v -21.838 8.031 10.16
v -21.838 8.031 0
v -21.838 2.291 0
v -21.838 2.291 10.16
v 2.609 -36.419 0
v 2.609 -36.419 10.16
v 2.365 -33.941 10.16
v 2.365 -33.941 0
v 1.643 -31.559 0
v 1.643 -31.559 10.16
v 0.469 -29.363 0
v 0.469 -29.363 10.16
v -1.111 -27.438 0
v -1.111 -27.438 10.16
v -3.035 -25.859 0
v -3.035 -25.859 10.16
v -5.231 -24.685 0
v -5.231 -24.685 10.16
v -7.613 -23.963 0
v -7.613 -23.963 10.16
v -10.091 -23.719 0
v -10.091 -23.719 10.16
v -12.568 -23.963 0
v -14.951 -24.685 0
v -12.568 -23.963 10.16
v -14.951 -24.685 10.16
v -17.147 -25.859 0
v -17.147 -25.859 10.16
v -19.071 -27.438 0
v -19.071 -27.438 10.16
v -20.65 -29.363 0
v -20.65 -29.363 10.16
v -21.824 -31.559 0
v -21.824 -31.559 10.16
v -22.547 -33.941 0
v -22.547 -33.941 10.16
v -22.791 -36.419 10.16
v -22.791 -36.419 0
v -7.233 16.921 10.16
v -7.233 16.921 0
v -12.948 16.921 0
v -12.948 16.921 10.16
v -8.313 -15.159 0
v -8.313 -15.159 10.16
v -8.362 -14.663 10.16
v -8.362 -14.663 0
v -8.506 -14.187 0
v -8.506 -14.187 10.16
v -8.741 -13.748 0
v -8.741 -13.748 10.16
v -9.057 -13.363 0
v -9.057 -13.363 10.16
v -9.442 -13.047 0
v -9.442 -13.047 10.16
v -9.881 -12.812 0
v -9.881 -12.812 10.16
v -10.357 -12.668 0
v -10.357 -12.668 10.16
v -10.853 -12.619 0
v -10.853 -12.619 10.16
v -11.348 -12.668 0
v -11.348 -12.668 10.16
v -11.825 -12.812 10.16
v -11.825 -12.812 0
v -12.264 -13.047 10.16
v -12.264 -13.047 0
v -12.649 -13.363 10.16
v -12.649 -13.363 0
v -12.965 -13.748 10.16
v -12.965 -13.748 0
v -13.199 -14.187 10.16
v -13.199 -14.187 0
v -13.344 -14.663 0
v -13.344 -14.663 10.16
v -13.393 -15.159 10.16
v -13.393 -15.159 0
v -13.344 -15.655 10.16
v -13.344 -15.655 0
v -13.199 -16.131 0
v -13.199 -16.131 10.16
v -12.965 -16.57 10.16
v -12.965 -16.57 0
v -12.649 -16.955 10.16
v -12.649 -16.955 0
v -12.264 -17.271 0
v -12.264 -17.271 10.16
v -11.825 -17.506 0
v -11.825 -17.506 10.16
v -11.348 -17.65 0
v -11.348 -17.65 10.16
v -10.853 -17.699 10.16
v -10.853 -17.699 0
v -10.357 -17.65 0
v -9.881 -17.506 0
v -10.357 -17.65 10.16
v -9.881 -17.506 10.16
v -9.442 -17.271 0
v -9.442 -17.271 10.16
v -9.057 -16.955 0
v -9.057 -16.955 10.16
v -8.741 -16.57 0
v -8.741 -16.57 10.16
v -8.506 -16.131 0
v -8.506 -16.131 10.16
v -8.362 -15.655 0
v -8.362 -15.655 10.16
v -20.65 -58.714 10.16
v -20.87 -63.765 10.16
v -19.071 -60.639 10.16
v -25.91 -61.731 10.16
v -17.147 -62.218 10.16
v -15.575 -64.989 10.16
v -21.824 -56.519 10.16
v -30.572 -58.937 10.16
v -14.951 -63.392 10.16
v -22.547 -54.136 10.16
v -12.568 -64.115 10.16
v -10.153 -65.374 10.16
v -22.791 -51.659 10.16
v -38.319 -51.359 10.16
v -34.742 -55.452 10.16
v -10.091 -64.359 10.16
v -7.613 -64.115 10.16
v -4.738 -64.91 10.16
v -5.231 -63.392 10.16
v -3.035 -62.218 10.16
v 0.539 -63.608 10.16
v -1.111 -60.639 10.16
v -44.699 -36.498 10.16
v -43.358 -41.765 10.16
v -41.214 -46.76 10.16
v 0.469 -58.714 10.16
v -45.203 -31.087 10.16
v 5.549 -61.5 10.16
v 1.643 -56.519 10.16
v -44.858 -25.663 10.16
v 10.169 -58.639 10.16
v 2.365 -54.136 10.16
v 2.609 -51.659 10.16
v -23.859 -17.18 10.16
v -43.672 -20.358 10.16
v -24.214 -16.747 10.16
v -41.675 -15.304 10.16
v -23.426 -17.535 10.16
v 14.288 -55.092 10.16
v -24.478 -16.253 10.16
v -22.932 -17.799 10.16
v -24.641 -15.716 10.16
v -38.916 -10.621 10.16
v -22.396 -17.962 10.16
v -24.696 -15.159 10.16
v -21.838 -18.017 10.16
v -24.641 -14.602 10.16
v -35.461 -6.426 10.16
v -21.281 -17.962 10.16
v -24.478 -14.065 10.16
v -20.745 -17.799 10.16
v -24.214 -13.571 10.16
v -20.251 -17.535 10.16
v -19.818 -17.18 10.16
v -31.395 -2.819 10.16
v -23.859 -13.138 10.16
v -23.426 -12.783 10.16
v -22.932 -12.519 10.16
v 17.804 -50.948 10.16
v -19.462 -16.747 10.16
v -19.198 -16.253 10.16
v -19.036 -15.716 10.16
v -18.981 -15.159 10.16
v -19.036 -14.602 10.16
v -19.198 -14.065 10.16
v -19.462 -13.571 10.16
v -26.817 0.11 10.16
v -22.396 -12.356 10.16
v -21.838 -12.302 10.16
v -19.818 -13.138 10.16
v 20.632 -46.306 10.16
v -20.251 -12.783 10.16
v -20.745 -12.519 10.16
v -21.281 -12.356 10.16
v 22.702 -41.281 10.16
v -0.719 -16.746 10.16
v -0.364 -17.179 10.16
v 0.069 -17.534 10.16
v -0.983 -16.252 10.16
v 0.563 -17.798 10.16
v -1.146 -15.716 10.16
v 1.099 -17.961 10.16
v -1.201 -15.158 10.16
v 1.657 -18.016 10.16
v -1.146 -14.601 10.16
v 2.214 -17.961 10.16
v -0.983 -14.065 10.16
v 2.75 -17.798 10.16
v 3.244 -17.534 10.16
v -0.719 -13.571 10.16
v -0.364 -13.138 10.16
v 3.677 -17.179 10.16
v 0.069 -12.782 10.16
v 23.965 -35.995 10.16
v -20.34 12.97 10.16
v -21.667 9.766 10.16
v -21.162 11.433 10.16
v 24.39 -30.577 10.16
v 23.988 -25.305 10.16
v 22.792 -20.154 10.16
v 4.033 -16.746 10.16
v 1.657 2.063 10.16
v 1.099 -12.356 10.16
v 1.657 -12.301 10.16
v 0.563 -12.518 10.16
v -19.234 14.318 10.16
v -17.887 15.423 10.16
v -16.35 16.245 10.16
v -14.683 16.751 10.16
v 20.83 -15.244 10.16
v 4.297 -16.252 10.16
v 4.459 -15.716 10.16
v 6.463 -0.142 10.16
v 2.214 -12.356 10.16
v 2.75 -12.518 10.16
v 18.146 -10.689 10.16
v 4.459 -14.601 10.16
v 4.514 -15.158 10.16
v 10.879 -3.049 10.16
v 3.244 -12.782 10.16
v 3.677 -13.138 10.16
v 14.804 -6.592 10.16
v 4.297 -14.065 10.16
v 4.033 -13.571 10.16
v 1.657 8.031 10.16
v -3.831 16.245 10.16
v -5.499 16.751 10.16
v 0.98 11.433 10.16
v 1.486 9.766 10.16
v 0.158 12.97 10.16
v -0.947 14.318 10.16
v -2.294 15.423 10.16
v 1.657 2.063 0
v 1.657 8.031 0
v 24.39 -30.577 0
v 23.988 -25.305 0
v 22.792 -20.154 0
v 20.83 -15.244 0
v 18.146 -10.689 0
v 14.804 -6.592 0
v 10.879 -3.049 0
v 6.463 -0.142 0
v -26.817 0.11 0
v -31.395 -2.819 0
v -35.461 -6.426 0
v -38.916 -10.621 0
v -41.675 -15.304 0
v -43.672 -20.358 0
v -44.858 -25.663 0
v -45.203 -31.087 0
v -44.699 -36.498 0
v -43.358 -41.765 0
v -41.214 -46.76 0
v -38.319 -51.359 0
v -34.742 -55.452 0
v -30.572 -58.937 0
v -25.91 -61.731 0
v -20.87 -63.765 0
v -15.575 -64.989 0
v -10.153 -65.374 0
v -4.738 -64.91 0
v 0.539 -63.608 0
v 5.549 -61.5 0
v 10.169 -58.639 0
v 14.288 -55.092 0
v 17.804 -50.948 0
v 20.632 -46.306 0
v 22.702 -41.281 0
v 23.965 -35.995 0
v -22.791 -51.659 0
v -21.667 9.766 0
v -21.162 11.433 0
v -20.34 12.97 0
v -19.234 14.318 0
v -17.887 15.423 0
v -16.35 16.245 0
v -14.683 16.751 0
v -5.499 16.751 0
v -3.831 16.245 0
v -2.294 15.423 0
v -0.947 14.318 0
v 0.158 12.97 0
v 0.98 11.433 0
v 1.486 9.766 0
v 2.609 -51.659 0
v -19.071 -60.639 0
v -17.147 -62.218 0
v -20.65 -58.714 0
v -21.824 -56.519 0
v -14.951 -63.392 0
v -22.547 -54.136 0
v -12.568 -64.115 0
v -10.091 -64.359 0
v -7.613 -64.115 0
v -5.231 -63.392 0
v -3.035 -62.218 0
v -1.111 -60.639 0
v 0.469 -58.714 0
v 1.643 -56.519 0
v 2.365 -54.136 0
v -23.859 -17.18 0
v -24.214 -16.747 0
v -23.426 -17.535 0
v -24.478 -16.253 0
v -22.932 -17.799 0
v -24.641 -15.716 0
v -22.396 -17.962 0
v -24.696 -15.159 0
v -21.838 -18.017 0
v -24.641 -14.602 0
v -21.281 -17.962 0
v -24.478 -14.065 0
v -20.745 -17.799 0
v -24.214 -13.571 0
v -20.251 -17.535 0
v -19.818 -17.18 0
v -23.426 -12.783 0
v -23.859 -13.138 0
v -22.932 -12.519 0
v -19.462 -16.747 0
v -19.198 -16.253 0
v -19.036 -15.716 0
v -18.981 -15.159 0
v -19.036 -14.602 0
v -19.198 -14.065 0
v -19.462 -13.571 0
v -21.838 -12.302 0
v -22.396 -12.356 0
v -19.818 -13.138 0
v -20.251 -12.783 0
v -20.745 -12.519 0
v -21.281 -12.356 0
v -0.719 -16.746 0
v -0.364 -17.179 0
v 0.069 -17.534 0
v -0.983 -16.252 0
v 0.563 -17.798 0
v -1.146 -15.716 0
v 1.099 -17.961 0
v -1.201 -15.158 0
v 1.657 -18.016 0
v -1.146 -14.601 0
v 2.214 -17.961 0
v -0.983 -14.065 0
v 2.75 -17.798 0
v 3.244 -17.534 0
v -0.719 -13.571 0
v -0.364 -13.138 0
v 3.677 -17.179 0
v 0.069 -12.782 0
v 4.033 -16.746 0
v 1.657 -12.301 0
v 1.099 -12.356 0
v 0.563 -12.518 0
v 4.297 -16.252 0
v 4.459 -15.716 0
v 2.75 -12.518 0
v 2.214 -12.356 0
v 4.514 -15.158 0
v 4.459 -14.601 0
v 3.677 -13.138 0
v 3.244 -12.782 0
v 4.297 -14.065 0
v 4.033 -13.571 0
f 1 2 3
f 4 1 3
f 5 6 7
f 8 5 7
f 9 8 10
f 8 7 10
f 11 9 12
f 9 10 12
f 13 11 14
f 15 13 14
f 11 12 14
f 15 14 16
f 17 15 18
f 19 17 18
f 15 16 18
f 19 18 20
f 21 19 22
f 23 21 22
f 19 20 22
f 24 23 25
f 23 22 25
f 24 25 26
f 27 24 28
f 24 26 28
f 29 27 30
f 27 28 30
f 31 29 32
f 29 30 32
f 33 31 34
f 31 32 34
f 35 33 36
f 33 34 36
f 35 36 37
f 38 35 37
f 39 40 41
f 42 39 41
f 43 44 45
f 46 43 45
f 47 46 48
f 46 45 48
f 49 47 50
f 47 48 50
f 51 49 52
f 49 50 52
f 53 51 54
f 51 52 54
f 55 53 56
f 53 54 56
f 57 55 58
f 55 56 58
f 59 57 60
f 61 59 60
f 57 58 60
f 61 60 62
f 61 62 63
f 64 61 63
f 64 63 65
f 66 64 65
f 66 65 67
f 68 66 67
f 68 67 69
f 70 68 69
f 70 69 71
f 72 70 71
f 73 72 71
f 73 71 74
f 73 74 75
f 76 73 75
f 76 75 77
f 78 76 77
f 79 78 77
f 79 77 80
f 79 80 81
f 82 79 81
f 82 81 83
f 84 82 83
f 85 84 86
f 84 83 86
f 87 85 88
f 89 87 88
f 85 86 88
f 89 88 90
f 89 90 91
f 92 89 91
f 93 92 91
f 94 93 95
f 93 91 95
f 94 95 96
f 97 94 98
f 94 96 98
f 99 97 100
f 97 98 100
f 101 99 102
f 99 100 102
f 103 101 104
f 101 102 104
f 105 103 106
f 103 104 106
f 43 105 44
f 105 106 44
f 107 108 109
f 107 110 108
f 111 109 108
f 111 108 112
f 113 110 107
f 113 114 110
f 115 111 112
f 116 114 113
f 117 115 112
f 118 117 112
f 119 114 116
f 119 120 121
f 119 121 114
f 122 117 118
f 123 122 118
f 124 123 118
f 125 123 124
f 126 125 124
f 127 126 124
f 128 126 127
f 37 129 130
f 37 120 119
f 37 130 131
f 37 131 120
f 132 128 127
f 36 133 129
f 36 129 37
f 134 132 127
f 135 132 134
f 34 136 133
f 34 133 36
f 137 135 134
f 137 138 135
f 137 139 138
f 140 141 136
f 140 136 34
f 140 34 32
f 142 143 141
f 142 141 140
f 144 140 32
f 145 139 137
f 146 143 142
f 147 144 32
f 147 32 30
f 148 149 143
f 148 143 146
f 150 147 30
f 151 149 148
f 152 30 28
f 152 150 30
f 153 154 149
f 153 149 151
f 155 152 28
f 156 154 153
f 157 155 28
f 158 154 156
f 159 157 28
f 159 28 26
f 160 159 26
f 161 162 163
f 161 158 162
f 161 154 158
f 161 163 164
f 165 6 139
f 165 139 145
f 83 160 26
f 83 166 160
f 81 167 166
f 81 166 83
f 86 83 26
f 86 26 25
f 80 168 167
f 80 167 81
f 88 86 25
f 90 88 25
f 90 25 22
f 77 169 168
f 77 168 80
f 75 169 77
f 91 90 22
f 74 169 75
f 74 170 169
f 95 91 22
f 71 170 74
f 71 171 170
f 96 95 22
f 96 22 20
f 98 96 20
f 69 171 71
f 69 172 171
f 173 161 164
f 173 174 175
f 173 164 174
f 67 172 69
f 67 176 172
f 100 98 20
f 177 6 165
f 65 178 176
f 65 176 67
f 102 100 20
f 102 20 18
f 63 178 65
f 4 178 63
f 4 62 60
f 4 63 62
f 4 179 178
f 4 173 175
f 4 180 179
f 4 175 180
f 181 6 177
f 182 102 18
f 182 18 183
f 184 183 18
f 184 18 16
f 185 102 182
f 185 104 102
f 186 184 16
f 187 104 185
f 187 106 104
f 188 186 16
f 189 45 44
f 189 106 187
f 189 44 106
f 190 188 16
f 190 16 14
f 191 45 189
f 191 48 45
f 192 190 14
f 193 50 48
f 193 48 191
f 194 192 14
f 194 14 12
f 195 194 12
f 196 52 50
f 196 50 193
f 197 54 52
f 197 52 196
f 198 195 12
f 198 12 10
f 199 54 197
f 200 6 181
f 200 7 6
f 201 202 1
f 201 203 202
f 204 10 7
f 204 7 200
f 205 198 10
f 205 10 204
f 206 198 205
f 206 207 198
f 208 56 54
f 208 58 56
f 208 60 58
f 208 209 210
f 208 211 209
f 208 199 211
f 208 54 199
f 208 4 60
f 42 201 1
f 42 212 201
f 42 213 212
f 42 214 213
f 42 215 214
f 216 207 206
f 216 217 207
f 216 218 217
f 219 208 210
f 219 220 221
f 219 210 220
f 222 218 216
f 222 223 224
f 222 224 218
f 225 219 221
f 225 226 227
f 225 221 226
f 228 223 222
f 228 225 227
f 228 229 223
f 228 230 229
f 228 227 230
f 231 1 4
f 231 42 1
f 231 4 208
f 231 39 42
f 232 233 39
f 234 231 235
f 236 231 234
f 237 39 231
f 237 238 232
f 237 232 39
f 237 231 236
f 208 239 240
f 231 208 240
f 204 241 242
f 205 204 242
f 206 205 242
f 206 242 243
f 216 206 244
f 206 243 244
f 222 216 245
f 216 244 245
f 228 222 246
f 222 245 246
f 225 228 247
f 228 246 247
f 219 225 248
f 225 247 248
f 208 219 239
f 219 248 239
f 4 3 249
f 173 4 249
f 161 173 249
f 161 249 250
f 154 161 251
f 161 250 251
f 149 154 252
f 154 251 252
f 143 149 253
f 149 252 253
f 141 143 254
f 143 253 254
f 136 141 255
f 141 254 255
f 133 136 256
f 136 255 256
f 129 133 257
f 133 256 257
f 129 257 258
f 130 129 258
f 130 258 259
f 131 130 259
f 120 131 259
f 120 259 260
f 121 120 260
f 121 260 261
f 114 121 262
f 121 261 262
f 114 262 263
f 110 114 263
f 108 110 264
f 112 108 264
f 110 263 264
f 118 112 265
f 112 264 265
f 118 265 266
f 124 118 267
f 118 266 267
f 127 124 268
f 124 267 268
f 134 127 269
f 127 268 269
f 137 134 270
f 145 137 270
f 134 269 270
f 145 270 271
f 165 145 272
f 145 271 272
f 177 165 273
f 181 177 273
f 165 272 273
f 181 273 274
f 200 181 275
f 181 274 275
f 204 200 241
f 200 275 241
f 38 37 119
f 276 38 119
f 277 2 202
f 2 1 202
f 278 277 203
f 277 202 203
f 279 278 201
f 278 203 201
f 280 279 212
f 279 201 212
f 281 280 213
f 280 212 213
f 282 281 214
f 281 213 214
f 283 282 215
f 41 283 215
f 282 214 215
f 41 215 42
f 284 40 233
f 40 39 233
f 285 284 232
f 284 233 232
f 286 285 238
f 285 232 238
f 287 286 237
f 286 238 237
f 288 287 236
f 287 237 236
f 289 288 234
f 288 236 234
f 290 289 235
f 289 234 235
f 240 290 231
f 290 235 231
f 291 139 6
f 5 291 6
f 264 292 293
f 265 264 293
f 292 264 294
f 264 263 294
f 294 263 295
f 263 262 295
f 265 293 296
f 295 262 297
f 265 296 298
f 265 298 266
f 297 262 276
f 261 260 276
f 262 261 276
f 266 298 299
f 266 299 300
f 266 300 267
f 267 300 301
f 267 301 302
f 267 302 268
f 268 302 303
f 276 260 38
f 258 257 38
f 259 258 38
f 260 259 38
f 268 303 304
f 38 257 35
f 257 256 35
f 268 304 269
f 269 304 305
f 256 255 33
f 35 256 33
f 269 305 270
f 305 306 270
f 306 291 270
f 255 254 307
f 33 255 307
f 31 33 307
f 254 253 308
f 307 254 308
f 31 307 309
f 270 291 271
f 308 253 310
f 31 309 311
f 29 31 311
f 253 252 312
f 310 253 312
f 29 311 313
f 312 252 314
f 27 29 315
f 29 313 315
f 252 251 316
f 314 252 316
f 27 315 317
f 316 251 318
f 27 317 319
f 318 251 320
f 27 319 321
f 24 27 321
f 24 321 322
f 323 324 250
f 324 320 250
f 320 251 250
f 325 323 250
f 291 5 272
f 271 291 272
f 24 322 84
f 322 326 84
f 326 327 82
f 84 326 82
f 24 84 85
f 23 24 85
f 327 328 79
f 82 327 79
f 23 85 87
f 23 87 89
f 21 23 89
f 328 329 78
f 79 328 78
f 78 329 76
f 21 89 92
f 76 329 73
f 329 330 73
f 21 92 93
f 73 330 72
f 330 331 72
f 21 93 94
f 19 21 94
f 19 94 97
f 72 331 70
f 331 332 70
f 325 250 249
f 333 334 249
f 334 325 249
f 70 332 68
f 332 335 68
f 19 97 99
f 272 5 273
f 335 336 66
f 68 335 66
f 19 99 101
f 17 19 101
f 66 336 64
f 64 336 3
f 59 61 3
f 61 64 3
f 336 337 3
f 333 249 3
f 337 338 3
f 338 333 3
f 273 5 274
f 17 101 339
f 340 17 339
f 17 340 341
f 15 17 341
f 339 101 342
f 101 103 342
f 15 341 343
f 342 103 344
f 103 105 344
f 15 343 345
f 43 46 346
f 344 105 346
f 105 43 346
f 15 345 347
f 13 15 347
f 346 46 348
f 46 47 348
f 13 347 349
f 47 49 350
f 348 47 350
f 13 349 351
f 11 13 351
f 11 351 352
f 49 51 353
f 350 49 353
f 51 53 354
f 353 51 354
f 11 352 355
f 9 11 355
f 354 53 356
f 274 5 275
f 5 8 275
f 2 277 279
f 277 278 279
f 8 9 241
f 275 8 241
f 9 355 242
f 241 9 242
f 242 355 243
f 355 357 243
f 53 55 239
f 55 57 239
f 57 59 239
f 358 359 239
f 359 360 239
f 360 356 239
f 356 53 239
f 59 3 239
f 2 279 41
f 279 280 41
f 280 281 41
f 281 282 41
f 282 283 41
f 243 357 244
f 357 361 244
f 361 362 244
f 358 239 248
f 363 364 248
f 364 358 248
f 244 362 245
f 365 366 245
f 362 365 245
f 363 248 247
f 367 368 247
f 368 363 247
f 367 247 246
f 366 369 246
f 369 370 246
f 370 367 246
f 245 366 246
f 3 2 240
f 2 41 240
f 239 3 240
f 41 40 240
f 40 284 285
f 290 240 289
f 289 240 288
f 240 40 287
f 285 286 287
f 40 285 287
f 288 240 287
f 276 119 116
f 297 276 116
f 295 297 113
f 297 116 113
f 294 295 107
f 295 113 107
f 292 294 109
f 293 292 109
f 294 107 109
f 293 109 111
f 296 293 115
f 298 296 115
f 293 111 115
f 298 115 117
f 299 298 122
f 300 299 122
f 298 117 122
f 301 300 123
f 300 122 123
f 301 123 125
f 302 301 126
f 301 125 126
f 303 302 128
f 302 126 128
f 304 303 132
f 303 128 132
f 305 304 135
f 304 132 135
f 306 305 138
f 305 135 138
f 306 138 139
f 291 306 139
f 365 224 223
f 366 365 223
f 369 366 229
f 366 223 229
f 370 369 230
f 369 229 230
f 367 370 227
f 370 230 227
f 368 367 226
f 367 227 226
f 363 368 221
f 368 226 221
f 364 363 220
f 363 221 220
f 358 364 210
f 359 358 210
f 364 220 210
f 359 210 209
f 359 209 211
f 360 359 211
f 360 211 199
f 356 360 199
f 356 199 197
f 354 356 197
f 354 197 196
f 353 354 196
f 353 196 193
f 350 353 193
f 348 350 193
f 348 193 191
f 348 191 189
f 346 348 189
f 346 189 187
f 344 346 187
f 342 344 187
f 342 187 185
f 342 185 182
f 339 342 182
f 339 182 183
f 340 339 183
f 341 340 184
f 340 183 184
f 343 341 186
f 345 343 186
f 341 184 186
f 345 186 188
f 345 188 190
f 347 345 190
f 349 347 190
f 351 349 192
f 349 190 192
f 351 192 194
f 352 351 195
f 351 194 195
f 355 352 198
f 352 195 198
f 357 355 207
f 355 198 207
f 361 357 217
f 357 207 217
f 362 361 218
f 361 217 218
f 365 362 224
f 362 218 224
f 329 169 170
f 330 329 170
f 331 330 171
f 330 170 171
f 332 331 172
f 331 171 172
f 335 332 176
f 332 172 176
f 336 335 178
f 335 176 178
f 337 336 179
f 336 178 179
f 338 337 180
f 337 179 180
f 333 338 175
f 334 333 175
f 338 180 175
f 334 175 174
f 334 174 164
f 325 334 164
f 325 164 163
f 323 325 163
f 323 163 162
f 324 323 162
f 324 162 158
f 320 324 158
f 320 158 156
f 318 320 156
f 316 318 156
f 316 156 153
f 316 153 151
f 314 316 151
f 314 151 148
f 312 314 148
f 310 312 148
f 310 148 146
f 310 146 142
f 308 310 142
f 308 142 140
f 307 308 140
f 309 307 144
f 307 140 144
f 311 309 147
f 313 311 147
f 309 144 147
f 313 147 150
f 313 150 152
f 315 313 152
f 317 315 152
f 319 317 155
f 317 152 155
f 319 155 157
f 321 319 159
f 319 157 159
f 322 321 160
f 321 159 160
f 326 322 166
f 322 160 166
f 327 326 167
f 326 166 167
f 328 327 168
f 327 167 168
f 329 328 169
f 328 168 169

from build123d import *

# Parameters (mm, degrees)
F1_DEPTH = 10.16
F2_R     = 2.8575
F2_R_2   = 2.54
F3_DEPTH = 25.4
F4_R     = 8.89


with BuildPart() as f1:
    # F0 (on Top) → F1 (new body)
    with BuildSketch(Plane.XY):
        with BuildLine():
            ThreePointArc((-21.838268, 2.290616), (-30.572093, -58.937184), (24.389732, -30.576631))
            ThreePointArc((24.389732, -30.576631), (18.146405, -10.688658), (1.656732, 2.062863))
            ThreePointArc((1.656732, 2.062863), (-10.070964, 4.219734), (-21.838268, 2.290616))
        make_face()
        with BuildLine():
            ThreePointArc((-21.838268, 2.290616), (-10.070964, 4.219734), (1.656732, 2.062863))
            Line((1.656732, 2.062863), (1.656732, 16.921369))
            Line((1.656732, 16.921369), (-21.838268, 16.921369))
            Line((-21.838268, 16.921369), (-21.838268, 2.290616))
        make_face()
    extrude(amount=F1_DEPTH)

    # F2 (on face) → F3 (cut)
    with BuildSketch(Plane.XY.offset(10.16)):
        with Locations((-21.838268, -15.159007)):
            Circle(F2_R)
        with Locations((-10.852768, -15.159007)):
            Circle(F2_R_2)
        with Locations((1.656732, -15.158281)):
            Circle(F2_R)
        with BuildLine():
            Line((2.609232, -51.658631), (2.609232, -36.418631))
            ThreePointArc((2.609232, -36.418631), (-10.090768, -23.718631), (-22.790768, -36.418631))
            Line((-22.790768, -36.418631), (-22.790768, -51.658631))
            ThreePointArc((-22.790768, -51.658631), (-10.090768, -64.358631), (2.609232, -51.658631))
        make_face()
    extrude(amount=-F3_DEPTH, mode=Mode.SUBTRACT)

    # F4
    f4_edges = [f1.edges().sort_by_distance(p)[0] for p in [
        (-21.838268, 16.921369, 5.08),
        (1.656732, 16.921369, 5.08),
    ]]
    fillet(f4_edges, radius=F4_R)


solid = f1.part
